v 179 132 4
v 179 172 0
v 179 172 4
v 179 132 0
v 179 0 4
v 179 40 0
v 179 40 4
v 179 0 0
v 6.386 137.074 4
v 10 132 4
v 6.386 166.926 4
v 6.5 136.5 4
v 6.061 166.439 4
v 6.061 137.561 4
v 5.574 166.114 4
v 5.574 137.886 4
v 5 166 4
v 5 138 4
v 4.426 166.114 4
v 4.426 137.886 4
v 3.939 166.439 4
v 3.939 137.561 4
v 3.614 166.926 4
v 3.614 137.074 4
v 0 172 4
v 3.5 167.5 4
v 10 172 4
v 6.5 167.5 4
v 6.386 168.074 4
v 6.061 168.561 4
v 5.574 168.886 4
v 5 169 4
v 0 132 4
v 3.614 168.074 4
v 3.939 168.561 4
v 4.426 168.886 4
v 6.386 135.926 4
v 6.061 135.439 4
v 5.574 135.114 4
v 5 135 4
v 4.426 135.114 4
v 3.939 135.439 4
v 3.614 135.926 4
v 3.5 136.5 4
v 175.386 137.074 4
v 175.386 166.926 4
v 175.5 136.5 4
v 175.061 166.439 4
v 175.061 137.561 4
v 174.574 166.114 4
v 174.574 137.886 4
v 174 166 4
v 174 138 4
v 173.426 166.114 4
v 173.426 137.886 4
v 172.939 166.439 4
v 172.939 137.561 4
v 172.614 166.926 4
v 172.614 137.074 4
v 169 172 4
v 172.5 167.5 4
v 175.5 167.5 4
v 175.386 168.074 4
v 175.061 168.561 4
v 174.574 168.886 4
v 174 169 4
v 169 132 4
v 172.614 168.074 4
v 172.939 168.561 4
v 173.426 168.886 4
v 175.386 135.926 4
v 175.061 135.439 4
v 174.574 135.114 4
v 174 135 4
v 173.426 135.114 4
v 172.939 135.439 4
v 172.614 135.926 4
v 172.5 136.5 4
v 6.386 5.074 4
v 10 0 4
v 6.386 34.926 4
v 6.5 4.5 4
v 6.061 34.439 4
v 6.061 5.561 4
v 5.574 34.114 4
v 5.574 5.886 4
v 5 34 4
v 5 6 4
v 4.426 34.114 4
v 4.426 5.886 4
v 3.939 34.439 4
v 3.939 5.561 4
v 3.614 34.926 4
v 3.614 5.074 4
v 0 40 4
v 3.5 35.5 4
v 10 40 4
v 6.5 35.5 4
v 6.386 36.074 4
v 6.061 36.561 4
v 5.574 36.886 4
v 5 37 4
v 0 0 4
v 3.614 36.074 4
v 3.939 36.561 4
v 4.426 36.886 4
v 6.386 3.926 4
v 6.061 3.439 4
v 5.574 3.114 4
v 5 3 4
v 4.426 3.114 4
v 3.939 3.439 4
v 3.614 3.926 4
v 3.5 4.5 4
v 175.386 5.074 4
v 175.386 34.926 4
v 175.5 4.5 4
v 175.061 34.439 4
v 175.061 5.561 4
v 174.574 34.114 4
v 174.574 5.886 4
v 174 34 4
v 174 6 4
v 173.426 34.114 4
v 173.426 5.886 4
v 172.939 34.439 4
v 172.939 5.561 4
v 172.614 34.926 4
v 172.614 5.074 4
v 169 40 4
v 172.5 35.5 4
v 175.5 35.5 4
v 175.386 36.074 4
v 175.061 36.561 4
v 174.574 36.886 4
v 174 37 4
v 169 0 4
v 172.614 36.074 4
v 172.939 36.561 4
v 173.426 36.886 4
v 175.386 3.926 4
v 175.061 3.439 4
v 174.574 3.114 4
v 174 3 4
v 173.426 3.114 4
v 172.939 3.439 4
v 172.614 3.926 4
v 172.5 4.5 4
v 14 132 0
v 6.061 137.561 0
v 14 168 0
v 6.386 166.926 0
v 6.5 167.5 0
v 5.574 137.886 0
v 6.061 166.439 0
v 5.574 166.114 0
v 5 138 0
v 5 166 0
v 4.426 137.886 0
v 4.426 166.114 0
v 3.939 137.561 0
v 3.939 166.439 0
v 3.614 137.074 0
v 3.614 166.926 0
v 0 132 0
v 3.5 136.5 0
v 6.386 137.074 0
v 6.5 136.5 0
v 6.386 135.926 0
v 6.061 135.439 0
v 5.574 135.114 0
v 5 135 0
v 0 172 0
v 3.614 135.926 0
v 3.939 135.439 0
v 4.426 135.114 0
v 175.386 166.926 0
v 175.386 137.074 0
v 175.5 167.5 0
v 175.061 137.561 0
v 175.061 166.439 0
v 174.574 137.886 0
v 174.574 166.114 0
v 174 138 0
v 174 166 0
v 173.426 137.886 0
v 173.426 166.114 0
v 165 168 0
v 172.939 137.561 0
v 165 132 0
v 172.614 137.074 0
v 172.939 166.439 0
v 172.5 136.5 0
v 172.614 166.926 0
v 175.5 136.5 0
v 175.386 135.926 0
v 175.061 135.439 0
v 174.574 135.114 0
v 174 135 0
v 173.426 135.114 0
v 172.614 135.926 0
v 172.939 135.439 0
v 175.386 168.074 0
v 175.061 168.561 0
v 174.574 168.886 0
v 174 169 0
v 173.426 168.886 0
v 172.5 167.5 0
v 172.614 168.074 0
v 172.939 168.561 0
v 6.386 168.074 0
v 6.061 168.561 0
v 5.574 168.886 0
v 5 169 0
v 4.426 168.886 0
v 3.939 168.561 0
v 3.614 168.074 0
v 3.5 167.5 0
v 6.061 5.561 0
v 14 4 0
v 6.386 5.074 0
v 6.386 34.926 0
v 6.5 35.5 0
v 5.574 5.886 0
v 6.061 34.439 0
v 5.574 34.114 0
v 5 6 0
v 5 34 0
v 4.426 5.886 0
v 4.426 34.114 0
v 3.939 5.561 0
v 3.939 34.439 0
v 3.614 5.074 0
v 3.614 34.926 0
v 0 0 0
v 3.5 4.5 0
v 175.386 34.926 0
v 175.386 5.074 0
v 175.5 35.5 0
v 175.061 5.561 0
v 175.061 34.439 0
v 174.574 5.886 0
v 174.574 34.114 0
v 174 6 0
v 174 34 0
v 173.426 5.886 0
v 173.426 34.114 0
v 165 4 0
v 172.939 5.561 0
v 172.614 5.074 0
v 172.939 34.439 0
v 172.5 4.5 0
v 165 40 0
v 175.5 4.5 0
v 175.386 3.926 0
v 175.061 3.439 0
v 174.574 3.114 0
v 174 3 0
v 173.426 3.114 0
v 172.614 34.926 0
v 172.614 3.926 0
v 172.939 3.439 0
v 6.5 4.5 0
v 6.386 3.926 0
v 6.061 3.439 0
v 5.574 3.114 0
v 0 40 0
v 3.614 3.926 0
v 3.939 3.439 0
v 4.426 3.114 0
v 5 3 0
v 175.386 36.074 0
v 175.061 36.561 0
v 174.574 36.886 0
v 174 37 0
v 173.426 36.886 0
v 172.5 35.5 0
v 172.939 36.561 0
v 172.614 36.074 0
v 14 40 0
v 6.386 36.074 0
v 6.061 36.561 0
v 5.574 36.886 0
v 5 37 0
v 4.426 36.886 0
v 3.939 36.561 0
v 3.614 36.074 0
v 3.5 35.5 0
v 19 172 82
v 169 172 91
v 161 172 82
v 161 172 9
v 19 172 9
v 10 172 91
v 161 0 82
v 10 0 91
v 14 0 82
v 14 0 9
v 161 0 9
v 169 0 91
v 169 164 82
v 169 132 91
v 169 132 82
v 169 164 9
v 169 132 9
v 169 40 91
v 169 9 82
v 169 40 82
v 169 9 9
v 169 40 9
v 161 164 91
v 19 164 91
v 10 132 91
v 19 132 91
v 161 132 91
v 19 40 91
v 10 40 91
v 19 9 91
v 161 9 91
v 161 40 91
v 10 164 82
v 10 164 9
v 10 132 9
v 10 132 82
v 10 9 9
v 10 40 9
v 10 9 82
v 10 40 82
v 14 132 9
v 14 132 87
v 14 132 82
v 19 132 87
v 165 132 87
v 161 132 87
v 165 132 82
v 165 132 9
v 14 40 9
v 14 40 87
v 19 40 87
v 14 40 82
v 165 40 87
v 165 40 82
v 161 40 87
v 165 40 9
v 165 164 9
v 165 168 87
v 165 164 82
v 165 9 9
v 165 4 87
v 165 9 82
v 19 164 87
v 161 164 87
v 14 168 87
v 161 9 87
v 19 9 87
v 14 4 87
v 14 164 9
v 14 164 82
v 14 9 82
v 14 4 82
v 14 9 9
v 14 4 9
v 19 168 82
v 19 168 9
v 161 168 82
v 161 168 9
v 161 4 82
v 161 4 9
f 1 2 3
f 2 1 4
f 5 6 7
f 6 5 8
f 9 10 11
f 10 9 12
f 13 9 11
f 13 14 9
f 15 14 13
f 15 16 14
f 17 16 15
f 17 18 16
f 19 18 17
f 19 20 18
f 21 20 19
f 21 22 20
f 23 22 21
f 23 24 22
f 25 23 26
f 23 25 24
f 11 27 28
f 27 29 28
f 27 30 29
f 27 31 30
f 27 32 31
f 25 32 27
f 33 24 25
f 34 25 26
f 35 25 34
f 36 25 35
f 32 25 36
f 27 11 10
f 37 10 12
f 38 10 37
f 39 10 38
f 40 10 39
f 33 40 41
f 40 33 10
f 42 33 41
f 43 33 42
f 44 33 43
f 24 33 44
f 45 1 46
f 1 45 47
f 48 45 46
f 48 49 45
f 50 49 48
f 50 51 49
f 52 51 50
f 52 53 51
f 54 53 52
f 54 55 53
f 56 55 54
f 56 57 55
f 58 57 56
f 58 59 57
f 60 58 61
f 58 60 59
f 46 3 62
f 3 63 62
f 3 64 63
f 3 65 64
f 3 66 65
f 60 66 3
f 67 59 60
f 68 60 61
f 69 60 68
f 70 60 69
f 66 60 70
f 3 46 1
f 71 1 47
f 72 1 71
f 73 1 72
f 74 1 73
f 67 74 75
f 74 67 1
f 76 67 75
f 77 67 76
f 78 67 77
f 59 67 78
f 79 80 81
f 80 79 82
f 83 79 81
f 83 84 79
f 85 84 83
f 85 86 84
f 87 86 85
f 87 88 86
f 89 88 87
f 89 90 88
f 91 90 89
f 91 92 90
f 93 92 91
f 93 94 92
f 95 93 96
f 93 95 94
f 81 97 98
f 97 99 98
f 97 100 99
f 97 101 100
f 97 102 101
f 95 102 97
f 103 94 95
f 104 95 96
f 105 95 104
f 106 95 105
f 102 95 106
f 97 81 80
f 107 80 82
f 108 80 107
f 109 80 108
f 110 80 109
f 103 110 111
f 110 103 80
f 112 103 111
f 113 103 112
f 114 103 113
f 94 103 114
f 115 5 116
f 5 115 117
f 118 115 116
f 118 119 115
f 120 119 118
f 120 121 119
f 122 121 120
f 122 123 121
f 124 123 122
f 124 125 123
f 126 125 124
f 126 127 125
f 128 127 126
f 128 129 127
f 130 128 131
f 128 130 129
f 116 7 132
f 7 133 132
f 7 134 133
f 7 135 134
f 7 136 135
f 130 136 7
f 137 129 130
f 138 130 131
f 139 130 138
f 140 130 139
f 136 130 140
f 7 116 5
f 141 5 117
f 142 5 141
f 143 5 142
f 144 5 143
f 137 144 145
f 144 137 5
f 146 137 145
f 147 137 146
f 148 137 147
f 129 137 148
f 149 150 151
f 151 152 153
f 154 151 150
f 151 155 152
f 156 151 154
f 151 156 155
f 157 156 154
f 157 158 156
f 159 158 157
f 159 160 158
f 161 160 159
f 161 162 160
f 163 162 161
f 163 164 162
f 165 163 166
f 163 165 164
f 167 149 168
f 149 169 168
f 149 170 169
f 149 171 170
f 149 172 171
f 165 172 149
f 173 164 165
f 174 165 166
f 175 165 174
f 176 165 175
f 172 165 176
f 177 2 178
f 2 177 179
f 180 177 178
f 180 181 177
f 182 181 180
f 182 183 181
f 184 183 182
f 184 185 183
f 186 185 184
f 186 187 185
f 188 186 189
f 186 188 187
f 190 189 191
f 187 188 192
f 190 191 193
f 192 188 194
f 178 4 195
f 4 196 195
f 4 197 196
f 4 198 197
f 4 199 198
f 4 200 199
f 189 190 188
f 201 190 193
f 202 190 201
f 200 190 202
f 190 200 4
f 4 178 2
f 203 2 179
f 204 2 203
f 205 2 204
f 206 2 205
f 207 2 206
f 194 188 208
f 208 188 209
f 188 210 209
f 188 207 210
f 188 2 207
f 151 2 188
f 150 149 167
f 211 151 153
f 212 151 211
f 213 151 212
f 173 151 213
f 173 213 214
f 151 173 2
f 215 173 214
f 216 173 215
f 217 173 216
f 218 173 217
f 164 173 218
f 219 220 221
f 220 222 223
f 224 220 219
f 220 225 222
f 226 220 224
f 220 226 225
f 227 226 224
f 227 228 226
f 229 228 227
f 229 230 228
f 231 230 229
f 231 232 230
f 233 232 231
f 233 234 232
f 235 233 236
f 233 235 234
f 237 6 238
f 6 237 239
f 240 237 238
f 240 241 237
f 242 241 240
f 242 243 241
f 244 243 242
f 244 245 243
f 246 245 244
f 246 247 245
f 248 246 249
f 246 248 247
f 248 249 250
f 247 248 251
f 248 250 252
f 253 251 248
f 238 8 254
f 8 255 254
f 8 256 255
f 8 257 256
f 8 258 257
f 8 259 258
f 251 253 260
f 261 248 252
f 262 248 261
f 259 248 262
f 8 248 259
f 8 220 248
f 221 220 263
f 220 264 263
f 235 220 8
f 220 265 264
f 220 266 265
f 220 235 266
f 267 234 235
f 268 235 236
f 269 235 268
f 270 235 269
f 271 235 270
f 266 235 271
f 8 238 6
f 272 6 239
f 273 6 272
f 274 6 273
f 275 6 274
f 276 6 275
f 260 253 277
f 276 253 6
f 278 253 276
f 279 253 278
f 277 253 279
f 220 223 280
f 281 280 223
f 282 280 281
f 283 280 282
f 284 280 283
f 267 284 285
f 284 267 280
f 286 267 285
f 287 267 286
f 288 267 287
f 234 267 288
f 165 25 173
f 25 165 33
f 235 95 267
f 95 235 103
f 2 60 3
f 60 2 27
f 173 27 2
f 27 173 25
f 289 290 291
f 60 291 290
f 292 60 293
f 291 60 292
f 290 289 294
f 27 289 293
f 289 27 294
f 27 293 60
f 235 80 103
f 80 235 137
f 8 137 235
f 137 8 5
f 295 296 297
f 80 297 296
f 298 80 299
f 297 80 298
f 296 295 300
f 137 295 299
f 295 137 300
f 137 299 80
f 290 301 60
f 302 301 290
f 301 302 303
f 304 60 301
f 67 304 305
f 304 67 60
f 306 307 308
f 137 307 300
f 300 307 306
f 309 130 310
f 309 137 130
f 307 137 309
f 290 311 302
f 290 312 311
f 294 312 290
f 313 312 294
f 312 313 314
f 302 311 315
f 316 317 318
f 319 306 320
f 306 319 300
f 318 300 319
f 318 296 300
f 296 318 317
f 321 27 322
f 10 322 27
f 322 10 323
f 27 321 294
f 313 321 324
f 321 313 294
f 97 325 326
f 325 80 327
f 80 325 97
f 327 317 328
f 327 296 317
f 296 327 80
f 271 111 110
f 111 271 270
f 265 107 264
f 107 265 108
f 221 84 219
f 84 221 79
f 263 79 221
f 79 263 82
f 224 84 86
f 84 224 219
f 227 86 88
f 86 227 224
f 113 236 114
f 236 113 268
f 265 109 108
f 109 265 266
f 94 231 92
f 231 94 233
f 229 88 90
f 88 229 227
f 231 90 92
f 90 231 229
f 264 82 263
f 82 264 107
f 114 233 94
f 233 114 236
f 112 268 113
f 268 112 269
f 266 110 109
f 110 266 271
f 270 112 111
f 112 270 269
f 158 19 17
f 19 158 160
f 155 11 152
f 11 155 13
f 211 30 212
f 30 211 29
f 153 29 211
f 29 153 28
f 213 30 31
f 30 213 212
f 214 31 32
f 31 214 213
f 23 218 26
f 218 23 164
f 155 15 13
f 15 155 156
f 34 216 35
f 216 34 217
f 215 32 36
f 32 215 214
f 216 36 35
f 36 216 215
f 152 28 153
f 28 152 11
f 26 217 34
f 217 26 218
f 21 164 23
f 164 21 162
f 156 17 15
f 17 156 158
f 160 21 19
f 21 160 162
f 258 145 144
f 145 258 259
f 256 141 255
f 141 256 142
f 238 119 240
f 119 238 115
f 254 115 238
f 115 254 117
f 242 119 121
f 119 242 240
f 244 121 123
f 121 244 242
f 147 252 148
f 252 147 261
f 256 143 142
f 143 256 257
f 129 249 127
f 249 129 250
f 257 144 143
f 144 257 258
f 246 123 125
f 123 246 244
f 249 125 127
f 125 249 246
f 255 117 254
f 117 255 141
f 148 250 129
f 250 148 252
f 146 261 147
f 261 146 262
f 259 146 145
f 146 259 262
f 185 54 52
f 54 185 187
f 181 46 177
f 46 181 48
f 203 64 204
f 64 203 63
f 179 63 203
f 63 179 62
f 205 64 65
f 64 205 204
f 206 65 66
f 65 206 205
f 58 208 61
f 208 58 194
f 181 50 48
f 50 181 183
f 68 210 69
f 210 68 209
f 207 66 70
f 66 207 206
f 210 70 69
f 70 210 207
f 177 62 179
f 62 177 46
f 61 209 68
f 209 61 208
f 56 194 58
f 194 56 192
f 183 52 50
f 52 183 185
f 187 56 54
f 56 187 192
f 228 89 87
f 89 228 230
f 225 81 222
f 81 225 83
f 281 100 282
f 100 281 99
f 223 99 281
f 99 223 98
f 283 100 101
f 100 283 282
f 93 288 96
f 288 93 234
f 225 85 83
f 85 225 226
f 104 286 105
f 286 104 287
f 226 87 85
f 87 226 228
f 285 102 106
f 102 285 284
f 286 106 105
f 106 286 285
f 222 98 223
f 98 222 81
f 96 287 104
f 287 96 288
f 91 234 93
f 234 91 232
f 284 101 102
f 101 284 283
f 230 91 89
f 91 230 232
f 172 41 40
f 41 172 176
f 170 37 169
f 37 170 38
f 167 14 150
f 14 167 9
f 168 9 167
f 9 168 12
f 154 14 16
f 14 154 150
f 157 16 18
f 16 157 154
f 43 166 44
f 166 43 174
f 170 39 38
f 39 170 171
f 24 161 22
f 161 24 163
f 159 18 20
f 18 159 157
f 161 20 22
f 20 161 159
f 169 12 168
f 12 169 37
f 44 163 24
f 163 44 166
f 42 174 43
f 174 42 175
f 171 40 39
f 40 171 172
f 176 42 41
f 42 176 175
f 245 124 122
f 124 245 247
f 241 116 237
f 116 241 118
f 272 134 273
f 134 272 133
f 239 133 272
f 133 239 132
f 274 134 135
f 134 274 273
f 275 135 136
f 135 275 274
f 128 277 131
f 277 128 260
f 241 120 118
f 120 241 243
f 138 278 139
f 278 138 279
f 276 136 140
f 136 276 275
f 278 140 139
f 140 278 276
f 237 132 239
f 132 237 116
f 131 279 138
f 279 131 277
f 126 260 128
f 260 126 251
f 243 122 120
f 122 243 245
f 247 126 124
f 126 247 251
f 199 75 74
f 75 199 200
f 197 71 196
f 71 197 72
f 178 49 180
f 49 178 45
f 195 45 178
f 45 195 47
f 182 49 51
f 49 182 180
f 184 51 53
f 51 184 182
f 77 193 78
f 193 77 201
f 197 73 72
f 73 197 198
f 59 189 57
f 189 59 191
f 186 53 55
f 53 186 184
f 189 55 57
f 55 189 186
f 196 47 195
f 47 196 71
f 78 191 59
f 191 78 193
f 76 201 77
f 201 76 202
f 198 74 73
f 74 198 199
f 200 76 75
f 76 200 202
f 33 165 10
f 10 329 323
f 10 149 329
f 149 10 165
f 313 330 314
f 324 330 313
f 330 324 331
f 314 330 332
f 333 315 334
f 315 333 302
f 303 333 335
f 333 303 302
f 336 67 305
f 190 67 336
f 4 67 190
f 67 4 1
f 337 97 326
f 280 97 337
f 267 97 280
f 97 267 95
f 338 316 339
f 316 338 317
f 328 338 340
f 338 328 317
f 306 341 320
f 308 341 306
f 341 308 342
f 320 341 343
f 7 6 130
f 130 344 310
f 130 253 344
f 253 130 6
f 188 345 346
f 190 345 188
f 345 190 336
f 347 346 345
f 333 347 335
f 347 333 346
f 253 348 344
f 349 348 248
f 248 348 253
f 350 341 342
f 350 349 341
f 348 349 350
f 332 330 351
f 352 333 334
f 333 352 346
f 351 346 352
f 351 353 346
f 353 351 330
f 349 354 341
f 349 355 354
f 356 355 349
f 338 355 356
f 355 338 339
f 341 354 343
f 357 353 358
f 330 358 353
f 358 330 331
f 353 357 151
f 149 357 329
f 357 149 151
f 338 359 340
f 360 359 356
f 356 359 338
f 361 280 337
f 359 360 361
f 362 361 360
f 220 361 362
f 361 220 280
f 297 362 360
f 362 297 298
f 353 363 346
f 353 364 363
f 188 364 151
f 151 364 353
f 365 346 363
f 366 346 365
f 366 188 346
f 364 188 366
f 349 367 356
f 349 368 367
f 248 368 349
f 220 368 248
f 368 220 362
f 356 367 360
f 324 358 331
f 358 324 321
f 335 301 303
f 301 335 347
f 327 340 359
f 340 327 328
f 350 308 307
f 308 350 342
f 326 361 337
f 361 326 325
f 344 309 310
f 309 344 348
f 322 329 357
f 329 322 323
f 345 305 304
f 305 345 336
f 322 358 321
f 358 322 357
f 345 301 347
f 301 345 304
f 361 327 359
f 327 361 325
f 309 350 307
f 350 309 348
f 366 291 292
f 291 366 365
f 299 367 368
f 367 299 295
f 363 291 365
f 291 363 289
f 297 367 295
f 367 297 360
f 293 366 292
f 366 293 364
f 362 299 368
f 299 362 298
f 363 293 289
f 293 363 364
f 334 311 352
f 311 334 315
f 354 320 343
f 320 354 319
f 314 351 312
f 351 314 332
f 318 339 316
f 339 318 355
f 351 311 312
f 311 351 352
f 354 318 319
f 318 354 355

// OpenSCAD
// measurements in mm

twoParts = true; // true if you want the cage to be 2 smaller parts instead of a single item - works fine for me in two parts
twoPartsStrength = 40; // the length of the two cage parts - can be changed, 40 is mine

$fn = 16; // number of facets when drawing a circle
psuX = 151; // width of psu itself
psuY = 164; // depth of psu itself
psuZ = 87; // height of psu itself

strength = 4; // strength of material
baseSupport = 10; // width of the two strips with the screw holes at the sides of the cage
baseStrength = strength + baseSupport; // just a little helper
frameSupport = 5; // width of the cage elements

screwRadius = 1.5; // for m3 screws
screwDistanceY = (frameSupport + strength) / 2; // y distance of the screw inside the base support

 module cylinder_outer(height, radius, fn){ // because the ootb cylinder is undersized for drill holes! find this somewhere in the internets
   fudge = 1 / cos(180 / fn);
   cylinder(h = height, r = radius * fudge, $fn = fn);
}

// holes for single element design
holesDefault =  [
                    [baseSupport / 2, screwDistanceY],
                    [baseSupport / 2, psuY + 2 * strength - screwDistanceY],
                    [baseSupport / 2 + psuX + 2 * strength + baseSupport, screwDistanceY],
                    [baseSupport / 2 + psuX + 2 * strength + baseSupport, psuY + 2 * strength - screwDistanceY]
                ];

// additional holes if you print in two parts
holesTwoParts = [
                    [holesDefault[0].x, twoPartsStrength - screwDistanceY],
                    [holesDefault[1].x, psuY + 2 * strength - twoPartsStrength + screwDistanceY],
                    [holesDefault[2].x, twoPartsStrength - screwDistanceY],
                    [holesDefault[3].x, psuY + 2 * strength - twoPartsStrength + screwDistanceY]
                ];

// small module to drill holes in the base
module drillHoles(holeArray, radius){
    for(i = [0:1:len(holeArray) - 1]){
        translate([holeArray[i].x, holeArray[i].y, - 1])
            cylinder(strength + 2, radius, radius);
    }
}

difference(){
    
  union(){ 
    // this is the base on the bottom which will be bolted onto the surface
    cube([psuX + 2 * baseStrength, psuY + 2 * strength, strength]);

    // this block will turn into the cage
    translate([baseSupport, 0, 0]){
      cube([psuX + 2 * strength, psuY + 2 * strength, psuZ + strength]);
    }
  }
  
  // removing the area of the psu itself
  translate([baseStrength, strength, - 1]){
    cube([psuX, psuY, psuZ + 1]);
  }
  
  // removing the sides on the x axis
  translate([baseSupport - 1, strength + frameSupport, strength + frameSupport]){
    cube([psuX + 3 * strength, psuY - frameSupport - strength, psuZ -  2 * frameSupport - strength]);
  }
  
  // removing the sides on the y axis
  translate([baseSupport + frameSupport + strength, -1, frameSupport + strength]){
    cube([psuX - frameSupport - strength, psuY + 3 * strength, psuZ - 2 * frameSupport - strength]);
  }
  
  // removing the side on top
  translate([baseSupport + frameSupport + strength, frameSupport + strength, psuZ - 1]){
    cube([psuX - frameSupport - strength, psuY - frameSupport - strength, strength + 2]);
  }
  
  // IMPORTANT - removing the support of the side where power cables come out of the psu, otherwise they would be partly blocked - might not apply on your psu
  translate([baseSupport + strength, -1, frameSupport + strength]){
    cube([frameSupport + 1, strength + 2, psuZ - 2 * frameSupport - strength]);
  }
  
  drillHoles(holesDefault, screwRadius);
  
  // stuff to do when you you print in two parts
  if(twoParts){
      translate([-1, twoPartsStrength, -1]){
        // removing a chunk in the middle of the y axis, so we get 2 parts
        cube([psuX + 2 * baseStrength + 2, psuY + 2 * strength - 2 * twoPartsStrength, psuZ + strength + 2]);
      }
      // we need additional holes for the two part design
      drillHoles(holesTwoParts, screwRadius);
  }
  
}
